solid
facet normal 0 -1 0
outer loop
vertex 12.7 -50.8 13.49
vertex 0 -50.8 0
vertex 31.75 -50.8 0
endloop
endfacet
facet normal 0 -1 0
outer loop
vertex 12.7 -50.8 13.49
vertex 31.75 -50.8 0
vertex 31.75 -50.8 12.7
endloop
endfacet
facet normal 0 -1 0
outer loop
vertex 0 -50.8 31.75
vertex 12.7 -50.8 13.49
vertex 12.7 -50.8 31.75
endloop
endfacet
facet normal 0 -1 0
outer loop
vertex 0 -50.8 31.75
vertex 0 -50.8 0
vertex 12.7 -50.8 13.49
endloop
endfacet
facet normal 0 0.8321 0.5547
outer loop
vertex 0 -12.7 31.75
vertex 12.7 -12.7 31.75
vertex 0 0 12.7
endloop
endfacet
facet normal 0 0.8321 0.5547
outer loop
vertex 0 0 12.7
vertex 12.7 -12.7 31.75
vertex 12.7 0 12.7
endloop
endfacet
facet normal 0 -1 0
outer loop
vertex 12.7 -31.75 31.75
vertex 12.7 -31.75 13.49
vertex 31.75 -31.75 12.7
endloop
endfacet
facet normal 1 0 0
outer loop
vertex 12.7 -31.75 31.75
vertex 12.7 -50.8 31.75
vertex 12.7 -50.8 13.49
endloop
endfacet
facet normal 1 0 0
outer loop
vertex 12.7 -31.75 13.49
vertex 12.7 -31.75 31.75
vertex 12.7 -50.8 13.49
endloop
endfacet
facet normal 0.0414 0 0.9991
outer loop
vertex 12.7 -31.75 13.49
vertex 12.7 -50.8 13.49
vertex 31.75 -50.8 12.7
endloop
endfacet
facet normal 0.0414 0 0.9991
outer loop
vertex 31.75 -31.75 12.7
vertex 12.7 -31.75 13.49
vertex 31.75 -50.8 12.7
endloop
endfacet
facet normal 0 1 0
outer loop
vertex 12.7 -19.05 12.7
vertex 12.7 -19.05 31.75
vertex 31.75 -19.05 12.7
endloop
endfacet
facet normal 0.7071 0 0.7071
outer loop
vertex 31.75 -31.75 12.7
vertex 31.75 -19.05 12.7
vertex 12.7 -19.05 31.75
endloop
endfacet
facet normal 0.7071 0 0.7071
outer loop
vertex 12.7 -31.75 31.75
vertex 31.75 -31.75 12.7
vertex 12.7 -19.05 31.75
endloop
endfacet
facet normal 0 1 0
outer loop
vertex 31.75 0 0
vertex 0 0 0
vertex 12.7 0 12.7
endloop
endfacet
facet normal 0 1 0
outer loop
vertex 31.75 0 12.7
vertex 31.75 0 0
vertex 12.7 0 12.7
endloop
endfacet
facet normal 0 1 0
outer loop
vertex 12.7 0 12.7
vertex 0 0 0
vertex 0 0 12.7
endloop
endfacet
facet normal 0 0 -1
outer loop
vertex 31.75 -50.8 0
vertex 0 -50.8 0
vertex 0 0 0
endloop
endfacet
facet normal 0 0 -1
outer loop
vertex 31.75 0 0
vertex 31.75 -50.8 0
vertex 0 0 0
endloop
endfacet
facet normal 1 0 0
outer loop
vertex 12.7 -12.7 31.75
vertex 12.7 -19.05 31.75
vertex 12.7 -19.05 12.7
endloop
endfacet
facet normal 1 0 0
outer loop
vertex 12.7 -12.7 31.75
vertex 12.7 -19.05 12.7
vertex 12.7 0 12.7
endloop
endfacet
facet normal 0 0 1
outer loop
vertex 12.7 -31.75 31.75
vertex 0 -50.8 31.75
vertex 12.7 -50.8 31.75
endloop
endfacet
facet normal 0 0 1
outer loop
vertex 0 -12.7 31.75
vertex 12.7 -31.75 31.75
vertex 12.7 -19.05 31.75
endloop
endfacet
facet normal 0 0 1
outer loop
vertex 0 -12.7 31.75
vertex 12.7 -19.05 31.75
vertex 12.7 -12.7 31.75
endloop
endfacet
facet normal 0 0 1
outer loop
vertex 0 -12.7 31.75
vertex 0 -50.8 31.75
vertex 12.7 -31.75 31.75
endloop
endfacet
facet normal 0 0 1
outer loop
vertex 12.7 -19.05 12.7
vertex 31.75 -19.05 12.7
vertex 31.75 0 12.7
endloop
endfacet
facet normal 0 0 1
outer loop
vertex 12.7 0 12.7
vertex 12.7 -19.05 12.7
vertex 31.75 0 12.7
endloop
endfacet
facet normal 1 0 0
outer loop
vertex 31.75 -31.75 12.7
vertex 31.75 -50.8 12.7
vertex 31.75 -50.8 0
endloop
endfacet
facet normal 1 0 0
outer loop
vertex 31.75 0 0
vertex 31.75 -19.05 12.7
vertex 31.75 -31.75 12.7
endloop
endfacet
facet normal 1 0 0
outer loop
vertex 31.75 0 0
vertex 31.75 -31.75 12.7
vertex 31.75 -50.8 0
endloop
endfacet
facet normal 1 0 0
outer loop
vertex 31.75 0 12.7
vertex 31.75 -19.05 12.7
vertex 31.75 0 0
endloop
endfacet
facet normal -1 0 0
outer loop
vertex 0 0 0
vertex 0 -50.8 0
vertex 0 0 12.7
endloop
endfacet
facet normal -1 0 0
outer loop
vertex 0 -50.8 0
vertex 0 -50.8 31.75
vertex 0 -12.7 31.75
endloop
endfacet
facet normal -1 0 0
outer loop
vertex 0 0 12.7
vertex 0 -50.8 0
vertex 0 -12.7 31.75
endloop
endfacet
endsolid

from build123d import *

# Parameters (mm, degrees)
F0_W     = 50.8
F0_H     = 31.75
F1_DEPTH = 31.75
F3_DEPTH = 31.751
F5_DEPTH = 19.05
F7_DEPTH = 31.751
F9_DEPTH = 19.05


with BuildPart() as f1:
    # F0 (on Right) → F1 (new body)
    with BuildSketch(Plane.YZ):
        with Locations((-25.4, 15.875)):
            Rectangle(F0_W, F0_H)
    extrude(amount=F1_DEPTH)

    # F2 (on face) → F3 (cut, through all)
    with BuildSketch(Plane.YZ.offset(31.75)):
        Polygon((0, 31.75), (-12.7, 31.75), (0, 12.7), align=None)
    extrude(amount=-F3_DEPTH, mode=Mode.SUBTRACT)

    # F4 (on face) → F5 (cut)
    with BuildSketch(Plane.YZ.offset(31.75)):
        Polygon((0, 12.7), (-12.7, 31.75), (-19.05, 31.75), (-19.05, 12.7), align=None)
    extrude(amount=-F5_DEPTH, mode=Mode.SUBTRACT)

    # F6 (on face) → F7 (cut, through all)
    with BuildSketch(Plane(origin=(0, -19.05, 0), x_dir=(-1, 0, 0), z_dir=(0, 1, 0))):
        Polygon((-31.75, 12.7), (-12.7, 31.75), (-31.75, 31.75), align=None)
    extrude(amount=-F7_DEPTH, mode=Mode.SUBTRACT)

    # F8 (on face) → F9 (cut)
    with BuildSketch(Plane.XZ.offset(50.8)):
        Polygon((31.75, 12.7), (12.7, 31.75), (12.7, 13.490058), align=None)
    extrude(amount=-F9_DEPTH, mode=Mode.SUBTRACT)


solid = f1.part
